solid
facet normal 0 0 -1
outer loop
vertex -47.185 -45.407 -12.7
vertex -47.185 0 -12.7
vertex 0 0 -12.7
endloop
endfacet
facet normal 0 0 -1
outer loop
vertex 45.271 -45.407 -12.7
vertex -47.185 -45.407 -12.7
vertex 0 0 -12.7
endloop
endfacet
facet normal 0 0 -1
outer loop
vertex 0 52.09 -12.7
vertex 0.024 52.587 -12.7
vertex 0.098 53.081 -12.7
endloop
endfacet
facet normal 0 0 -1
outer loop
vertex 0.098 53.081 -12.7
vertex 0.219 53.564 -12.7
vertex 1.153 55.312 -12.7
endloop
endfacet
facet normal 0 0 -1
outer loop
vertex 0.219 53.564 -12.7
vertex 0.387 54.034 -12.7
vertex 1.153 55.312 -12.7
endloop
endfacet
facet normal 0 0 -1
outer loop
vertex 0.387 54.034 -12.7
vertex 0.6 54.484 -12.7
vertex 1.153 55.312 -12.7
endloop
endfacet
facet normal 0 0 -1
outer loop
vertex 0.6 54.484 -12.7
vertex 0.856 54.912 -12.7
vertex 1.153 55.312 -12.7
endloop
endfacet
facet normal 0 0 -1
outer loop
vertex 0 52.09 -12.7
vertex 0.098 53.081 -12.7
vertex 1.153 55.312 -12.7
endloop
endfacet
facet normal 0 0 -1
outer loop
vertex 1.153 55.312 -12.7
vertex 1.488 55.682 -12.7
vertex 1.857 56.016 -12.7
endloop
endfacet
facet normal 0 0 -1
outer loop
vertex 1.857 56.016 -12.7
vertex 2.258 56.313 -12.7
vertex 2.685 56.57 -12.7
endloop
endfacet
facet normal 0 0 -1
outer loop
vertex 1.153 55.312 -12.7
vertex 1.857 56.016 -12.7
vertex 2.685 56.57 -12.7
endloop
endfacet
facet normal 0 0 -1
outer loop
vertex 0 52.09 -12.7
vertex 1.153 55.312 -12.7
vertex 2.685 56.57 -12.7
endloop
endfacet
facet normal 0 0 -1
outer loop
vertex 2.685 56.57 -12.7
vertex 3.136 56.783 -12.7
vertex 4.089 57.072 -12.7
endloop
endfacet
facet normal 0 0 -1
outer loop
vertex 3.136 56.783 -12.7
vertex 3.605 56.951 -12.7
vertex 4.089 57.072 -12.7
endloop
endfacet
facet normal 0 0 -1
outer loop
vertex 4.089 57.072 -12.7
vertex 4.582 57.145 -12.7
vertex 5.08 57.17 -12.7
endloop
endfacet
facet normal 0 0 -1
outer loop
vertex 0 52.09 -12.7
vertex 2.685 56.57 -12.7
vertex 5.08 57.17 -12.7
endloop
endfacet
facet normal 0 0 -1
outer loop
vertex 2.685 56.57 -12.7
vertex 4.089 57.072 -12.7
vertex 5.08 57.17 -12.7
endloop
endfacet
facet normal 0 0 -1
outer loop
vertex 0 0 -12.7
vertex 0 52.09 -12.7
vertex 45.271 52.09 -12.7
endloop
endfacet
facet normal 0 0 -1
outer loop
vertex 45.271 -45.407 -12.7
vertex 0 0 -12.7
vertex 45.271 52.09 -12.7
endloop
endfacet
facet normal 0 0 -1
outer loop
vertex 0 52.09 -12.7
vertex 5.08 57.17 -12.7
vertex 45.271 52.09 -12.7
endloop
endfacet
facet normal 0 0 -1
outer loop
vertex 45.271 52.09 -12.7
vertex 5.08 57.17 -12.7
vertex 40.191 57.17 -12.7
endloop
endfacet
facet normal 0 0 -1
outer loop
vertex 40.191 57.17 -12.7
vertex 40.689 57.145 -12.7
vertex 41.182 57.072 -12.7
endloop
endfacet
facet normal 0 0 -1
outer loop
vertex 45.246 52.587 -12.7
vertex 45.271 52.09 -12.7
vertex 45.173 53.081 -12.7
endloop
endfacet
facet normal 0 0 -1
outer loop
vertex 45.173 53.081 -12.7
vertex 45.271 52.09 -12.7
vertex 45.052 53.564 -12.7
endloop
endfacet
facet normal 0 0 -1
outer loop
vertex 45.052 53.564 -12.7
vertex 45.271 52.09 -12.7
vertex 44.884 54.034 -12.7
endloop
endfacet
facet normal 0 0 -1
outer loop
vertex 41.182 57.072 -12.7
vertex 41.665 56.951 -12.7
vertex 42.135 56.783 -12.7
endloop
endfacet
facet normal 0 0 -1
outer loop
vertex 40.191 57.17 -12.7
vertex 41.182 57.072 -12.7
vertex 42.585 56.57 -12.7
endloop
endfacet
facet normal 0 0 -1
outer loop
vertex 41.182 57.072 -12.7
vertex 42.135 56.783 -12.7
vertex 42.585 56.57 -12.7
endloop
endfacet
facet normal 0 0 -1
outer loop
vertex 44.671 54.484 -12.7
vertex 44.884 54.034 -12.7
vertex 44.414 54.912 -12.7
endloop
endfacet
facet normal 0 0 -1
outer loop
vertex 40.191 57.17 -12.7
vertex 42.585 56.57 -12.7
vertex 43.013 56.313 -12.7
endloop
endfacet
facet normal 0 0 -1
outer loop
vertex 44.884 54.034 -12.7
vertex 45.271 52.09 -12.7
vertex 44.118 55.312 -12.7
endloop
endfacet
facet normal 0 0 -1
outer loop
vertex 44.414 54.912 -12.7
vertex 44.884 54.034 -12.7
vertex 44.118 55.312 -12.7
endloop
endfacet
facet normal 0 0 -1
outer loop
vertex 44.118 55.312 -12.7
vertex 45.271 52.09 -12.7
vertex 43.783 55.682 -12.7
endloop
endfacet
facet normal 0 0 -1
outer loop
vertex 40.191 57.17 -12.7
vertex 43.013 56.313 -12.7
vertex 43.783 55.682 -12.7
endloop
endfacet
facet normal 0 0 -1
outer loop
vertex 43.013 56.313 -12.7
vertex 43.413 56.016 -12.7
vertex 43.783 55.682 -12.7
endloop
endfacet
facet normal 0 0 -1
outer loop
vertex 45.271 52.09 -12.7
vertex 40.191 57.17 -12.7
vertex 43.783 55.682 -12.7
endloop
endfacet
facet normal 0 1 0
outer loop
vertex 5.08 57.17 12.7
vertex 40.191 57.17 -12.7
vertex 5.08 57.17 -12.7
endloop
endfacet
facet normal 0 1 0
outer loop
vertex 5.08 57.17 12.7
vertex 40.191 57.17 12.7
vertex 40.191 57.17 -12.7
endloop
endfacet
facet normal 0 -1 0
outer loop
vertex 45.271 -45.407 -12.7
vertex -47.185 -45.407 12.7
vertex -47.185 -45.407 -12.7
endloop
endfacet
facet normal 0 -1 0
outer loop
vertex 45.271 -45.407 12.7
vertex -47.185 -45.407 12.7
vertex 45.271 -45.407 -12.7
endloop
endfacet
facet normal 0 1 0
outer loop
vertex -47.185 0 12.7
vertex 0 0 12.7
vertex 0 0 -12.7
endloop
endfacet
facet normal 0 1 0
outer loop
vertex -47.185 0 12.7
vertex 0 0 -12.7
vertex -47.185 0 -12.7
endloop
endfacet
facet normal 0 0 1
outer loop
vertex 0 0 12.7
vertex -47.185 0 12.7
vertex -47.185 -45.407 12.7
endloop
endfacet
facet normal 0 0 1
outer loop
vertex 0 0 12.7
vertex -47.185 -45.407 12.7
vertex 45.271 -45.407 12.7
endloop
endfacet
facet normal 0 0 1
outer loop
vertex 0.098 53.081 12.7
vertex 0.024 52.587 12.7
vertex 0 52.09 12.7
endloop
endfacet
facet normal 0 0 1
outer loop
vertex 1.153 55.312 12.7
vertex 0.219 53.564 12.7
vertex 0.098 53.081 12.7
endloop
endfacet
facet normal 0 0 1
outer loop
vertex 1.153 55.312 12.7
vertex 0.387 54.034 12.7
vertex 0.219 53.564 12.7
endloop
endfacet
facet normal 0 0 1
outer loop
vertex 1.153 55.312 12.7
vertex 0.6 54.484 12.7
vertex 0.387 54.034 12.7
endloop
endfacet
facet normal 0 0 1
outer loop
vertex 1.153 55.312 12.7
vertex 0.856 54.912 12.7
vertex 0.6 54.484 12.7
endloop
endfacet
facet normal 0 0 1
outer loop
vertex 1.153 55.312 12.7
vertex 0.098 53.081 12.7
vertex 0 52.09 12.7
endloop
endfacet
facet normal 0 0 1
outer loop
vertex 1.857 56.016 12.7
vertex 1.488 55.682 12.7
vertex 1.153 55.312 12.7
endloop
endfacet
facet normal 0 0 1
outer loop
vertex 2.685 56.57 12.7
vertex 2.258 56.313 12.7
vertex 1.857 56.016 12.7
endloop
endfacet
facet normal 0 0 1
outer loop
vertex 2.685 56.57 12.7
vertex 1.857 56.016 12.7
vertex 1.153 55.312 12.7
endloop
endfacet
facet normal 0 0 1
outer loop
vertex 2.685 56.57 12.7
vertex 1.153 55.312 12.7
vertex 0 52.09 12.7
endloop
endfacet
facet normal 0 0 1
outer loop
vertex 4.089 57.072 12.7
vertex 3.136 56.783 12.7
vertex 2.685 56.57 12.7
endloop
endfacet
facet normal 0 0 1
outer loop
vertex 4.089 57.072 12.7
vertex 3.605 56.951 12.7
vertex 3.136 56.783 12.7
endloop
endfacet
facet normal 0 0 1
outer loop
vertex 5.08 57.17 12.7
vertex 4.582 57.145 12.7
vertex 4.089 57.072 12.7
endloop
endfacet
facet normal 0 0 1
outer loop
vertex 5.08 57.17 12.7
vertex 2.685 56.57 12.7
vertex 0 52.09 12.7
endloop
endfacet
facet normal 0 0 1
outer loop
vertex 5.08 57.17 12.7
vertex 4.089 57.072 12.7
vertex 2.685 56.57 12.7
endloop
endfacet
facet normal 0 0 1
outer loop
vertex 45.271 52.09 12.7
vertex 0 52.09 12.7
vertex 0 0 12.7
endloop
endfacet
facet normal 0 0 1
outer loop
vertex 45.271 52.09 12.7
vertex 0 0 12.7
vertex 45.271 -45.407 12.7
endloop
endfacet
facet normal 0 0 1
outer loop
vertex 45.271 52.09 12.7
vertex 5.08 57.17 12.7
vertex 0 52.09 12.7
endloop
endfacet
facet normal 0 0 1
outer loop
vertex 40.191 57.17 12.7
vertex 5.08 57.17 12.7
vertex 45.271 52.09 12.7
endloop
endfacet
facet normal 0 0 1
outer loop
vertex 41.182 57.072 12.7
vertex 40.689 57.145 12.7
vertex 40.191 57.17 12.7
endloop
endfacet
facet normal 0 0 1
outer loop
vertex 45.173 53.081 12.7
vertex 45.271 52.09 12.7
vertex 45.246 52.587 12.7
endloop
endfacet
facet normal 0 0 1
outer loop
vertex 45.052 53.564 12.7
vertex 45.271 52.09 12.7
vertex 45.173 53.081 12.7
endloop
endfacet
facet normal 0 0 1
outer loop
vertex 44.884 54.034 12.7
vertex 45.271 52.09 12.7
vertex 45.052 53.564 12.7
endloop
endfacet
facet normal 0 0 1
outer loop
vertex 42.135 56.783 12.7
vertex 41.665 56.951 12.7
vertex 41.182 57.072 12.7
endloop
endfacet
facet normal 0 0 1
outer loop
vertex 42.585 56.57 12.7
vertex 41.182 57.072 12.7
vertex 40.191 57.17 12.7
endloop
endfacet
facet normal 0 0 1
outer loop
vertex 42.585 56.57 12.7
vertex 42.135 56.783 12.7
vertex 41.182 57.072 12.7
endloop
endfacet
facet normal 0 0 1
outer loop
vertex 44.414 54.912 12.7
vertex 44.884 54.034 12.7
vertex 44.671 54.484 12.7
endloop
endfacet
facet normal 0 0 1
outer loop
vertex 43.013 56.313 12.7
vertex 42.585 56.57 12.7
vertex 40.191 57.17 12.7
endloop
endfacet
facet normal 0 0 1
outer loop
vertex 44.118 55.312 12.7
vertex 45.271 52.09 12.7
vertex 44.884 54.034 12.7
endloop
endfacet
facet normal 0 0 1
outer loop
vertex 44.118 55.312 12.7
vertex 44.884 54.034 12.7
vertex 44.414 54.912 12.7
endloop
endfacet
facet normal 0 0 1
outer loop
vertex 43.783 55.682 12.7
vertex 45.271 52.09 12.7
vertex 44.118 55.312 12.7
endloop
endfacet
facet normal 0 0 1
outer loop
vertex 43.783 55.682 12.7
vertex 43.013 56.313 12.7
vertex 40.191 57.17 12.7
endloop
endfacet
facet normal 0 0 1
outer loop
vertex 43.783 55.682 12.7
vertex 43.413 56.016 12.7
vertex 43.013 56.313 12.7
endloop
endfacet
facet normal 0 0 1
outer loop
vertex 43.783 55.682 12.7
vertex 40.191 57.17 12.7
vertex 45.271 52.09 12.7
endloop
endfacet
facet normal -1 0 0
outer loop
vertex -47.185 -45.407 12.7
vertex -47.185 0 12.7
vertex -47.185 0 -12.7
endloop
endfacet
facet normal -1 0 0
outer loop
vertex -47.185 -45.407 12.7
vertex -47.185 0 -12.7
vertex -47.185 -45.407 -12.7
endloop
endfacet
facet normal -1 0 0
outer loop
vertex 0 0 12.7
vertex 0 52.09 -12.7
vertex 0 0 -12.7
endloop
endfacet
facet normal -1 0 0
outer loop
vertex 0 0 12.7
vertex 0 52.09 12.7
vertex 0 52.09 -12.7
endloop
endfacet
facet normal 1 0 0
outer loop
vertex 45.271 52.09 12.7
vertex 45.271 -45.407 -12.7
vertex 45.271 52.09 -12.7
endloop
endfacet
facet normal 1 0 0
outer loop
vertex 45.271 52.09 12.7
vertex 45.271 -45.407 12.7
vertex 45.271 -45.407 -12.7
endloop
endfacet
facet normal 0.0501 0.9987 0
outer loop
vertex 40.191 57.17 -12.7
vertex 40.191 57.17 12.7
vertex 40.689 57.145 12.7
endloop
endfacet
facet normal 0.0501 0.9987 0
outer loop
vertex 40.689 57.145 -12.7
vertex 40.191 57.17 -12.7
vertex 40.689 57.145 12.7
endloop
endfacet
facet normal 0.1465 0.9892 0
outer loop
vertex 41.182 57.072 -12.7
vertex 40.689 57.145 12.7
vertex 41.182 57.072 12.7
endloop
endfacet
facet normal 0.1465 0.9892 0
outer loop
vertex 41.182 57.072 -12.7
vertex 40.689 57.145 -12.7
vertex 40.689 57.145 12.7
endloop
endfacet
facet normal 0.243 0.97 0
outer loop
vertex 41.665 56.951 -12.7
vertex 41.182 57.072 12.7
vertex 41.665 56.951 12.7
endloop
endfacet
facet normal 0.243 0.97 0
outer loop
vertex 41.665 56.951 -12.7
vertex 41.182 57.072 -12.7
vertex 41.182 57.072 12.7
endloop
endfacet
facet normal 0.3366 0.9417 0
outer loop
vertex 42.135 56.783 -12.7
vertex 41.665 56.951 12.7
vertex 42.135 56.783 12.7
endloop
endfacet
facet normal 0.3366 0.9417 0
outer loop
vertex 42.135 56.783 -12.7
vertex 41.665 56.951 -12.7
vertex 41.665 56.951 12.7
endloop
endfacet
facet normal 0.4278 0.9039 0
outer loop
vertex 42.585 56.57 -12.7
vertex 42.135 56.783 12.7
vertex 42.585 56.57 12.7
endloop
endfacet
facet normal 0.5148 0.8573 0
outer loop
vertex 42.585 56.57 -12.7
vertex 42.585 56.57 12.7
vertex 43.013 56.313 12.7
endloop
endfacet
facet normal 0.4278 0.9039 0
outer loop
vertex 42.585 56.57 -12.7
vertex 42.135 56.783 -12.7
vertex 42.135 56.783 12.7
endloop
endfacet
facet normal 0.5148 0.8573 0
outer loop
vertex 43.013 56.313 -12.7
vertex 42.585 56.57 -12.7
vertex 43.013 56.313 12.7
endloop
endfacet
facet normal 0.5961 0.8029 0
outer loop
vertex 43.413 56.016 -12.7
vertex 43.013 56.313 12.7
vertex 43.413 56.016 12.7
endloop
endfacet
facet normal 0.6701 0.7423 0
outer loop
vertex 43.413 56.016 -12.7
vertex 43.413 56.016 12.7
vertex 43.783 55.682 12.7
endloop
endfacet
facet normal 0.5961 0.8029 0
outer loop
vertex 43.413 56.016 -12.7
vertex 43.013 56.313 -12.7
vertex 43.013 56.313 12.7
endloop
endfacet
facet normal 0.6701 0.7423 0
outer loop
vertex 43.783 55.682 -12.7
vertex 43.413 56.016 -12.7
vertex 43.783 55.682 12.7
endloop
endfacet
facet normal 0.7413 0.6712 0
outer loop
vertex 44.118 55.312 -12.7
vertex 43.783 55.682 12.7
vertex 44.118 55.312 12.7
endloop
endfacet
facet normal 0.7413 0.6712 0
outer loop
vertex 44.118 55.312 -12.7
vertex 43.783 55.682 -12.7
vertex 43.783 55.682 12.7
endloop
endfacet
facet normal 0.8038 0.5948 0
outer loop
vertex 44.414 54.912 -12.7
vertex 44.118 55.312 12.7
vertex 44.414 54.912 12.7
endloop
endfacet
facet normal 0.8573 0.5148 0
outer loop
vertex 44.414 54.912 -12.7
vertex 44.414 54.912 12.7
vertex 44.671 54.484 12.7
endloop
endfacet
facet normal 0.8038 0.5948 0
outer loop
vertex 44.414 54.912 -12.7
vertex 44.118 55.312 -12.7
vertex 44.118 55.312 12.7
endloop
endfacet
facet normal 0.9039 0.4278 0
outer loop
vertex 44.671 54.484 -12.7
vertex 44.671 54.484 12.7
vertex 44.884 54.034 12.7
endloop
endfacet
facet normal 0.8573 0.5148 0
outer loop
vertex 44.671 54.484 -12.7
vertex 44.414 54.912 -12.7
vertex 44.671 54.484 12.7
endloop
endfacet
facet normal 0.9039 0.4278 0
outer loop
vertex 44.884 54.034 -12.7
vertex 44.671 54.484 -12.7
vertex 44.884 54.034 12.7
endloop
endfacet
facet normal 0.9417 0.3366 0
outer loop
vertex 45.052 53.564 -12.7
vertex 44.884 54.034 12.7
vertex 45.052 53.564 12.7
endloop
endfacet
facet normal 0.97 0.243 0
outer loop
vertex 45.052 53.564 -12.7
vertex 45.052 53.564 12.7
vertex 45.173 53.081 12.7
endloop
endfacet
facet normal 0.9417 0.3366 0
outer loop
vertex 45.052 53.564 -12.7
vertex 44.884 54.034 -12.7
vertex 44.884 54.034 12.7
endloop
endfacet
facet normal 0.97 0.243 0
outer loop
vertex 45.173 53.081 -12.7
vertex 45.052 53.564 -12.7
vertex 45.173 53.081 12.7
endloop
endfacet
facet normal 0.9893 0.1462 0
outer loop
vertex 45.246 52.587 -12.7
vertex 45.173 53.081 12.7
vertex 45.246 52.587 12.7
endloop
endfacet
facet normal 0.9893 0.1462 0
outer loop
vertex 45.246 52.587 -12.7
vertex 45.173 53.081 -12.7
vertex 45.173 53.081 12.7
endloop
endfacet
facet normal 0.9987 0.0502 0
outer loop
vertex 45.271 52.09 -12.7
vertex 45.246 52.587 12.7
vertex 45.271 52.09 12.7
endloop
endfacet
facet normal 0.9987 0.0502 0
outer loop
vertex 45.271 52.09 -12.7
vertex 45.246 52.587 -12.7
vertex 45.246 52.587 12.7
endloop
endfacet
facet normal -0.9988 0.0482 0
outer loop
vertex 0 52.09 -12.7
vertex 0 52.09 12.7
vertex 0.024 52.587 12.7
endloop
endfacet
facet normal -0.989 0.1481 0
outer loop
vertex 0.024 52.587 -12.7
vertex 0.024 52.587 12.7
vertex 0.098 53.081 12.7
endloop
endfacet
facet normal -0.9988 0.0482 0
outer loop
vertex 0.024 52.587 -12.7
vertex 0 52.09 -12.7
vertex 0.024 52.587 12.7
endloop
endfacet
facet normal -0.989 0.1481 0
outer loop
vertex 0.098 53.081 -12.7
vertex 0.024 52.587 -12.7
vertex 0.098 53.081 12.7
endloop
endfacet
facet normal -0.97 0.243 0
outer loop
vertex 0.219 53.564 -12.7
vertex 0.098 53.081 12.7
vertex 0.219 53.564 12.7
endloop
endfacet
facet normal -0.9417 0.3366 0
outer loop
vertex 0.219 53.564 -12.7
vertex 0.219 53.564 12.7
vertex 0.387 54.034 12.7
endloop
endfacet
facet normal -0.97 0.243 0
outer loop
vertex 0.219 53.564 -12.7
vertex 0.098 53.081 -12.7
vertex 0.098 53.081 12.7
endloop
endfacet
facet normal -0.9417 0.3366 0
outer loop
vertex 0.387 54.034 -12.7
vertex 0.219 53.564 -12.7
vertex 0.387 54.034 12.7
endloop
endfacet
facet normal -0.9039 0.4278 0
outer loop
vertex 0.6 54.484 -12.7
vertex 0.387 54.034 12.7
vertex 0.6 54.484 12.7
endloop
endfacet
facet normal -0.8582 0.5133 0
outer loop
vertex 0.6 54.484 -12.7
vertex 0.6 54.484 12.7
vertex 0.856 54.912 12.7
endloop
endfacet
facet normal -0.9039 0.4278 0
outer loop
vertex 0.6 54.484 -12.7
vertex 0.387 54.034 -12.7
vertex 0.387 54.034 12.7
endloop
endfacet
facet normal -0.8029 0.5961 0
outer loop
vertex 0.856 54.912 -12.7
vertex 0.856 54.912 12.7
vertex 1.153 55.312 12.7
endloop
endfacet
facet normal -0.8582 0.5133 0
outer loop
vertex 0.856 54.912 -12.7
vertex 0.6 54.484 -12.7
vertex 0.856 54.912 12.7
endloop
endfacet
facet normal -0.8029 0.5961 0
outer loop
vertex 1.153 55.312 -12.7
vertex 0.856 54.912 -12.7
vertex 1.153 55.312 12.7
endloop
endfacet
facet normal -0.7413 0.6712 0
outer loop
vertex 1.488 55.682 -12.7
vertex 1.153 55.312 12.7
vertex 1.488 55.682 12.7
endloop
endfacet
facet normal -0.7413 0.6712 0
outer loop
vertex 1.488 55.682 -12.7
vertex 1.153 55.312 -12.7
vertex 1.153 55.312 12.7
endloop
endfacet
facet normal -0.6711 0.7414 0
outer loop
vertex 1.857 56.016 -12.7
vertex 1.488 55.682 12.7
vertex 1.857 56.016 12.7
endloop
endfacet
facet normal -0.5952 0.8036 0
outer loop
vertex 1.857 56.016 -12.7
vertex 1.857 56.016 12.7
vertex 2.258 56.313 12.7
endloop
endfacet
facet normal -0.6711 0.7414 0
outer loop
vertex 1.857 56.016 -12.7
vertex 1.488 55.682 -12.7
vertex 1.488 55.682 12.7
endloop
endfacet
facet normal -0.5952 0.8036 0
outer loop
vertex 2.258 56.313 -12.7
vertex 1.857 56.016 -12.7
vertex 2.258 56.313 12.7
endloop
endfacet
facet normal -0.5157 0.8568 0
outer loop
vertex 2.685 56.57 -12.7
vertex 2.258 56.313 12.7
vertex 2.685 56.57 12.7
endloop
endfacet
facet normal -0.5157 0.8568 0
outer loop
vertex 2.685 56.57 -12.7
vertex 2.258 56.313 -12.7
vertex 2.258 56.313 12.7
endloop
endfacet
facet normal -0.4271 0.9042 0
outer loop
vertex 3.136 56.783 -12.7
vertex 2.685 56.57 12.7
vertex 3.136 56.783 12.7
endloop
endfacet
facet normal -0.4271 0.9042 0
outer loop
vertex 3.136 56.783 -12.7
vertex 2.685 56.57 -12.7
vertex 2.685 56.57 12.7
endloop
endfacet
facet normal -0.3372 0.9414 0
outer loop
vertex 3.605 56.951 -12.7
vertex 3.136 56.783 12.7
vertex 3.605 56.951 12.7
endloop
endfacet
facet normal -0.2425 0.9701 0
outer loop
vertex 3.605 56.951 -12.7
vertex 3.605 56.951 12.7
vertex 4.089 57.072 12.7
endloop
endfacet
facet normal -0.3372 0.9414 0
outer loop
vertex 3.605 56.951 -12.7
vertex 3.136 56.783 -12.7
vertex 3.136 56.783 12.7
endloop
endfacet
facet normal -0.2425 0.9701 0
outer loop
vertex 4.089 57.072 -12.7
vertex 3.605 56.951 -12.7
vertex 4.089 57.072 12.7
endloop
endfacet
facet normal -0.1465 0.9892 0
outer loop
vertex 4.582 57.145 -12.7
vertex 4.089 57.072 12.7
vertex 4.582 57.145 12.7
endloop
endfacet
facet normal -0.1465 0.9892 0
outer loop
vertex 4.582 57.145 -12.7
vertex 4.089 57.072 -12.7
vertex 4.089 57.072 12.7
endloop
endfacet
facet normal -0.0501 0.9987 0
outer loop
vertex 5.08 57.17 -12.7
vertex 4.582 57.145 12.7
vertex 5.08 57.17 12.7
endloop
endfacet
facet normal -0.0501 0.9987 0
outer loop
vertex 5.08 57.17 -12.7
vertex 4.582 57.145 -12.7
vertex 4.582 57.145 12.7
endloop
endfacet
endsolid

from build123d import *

# Parameters (mm, degrees)
F1_DEPTH = 12.7
F2_R     = 5.08


with BuildPart() as f1:
    # F0 (on Top) → F1 (new body, symmetric)
    with BuildSketch(Plane.XY):
        Polygon((0, 57.169542), (0, 0), (-47.185387, 0), (-47.185387, -45.407388), (45.270618, -45.407388), (45.270618, 57.169542), align=None)
    extrude(amount=F1_DEPTH, both=True)

    # F2
    f2_edges = [f1.edges().sort_by_distance(p)[0] for p in [
        (0, 57.169542, 0),
        (45.270618, 57.169542, 0),
    ]]
    fillet(f2_edges, radius=F2_R)


solid = f1.part
